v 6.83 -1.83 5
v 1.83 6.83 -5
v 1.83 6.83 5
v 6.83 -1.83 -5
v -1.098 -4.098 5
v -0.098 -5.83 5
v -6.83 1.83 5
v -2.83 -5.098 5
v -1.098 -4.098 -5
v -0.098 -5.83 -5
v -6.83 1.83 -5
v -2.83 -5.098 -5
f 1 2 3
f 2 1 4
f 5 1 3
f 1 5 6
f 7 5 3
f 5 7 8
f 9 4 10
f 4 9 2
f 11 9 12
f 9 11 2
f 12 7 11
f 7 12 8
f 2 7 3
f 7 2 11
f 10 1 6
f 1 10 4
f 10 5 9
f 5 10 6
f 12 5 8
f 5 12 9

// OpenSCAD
rotate([0,0,+30]) {
    difference() {
        cube(10, center=true);
        translate([-8,-8,0])
            cube(10, center=true);
    }
}
